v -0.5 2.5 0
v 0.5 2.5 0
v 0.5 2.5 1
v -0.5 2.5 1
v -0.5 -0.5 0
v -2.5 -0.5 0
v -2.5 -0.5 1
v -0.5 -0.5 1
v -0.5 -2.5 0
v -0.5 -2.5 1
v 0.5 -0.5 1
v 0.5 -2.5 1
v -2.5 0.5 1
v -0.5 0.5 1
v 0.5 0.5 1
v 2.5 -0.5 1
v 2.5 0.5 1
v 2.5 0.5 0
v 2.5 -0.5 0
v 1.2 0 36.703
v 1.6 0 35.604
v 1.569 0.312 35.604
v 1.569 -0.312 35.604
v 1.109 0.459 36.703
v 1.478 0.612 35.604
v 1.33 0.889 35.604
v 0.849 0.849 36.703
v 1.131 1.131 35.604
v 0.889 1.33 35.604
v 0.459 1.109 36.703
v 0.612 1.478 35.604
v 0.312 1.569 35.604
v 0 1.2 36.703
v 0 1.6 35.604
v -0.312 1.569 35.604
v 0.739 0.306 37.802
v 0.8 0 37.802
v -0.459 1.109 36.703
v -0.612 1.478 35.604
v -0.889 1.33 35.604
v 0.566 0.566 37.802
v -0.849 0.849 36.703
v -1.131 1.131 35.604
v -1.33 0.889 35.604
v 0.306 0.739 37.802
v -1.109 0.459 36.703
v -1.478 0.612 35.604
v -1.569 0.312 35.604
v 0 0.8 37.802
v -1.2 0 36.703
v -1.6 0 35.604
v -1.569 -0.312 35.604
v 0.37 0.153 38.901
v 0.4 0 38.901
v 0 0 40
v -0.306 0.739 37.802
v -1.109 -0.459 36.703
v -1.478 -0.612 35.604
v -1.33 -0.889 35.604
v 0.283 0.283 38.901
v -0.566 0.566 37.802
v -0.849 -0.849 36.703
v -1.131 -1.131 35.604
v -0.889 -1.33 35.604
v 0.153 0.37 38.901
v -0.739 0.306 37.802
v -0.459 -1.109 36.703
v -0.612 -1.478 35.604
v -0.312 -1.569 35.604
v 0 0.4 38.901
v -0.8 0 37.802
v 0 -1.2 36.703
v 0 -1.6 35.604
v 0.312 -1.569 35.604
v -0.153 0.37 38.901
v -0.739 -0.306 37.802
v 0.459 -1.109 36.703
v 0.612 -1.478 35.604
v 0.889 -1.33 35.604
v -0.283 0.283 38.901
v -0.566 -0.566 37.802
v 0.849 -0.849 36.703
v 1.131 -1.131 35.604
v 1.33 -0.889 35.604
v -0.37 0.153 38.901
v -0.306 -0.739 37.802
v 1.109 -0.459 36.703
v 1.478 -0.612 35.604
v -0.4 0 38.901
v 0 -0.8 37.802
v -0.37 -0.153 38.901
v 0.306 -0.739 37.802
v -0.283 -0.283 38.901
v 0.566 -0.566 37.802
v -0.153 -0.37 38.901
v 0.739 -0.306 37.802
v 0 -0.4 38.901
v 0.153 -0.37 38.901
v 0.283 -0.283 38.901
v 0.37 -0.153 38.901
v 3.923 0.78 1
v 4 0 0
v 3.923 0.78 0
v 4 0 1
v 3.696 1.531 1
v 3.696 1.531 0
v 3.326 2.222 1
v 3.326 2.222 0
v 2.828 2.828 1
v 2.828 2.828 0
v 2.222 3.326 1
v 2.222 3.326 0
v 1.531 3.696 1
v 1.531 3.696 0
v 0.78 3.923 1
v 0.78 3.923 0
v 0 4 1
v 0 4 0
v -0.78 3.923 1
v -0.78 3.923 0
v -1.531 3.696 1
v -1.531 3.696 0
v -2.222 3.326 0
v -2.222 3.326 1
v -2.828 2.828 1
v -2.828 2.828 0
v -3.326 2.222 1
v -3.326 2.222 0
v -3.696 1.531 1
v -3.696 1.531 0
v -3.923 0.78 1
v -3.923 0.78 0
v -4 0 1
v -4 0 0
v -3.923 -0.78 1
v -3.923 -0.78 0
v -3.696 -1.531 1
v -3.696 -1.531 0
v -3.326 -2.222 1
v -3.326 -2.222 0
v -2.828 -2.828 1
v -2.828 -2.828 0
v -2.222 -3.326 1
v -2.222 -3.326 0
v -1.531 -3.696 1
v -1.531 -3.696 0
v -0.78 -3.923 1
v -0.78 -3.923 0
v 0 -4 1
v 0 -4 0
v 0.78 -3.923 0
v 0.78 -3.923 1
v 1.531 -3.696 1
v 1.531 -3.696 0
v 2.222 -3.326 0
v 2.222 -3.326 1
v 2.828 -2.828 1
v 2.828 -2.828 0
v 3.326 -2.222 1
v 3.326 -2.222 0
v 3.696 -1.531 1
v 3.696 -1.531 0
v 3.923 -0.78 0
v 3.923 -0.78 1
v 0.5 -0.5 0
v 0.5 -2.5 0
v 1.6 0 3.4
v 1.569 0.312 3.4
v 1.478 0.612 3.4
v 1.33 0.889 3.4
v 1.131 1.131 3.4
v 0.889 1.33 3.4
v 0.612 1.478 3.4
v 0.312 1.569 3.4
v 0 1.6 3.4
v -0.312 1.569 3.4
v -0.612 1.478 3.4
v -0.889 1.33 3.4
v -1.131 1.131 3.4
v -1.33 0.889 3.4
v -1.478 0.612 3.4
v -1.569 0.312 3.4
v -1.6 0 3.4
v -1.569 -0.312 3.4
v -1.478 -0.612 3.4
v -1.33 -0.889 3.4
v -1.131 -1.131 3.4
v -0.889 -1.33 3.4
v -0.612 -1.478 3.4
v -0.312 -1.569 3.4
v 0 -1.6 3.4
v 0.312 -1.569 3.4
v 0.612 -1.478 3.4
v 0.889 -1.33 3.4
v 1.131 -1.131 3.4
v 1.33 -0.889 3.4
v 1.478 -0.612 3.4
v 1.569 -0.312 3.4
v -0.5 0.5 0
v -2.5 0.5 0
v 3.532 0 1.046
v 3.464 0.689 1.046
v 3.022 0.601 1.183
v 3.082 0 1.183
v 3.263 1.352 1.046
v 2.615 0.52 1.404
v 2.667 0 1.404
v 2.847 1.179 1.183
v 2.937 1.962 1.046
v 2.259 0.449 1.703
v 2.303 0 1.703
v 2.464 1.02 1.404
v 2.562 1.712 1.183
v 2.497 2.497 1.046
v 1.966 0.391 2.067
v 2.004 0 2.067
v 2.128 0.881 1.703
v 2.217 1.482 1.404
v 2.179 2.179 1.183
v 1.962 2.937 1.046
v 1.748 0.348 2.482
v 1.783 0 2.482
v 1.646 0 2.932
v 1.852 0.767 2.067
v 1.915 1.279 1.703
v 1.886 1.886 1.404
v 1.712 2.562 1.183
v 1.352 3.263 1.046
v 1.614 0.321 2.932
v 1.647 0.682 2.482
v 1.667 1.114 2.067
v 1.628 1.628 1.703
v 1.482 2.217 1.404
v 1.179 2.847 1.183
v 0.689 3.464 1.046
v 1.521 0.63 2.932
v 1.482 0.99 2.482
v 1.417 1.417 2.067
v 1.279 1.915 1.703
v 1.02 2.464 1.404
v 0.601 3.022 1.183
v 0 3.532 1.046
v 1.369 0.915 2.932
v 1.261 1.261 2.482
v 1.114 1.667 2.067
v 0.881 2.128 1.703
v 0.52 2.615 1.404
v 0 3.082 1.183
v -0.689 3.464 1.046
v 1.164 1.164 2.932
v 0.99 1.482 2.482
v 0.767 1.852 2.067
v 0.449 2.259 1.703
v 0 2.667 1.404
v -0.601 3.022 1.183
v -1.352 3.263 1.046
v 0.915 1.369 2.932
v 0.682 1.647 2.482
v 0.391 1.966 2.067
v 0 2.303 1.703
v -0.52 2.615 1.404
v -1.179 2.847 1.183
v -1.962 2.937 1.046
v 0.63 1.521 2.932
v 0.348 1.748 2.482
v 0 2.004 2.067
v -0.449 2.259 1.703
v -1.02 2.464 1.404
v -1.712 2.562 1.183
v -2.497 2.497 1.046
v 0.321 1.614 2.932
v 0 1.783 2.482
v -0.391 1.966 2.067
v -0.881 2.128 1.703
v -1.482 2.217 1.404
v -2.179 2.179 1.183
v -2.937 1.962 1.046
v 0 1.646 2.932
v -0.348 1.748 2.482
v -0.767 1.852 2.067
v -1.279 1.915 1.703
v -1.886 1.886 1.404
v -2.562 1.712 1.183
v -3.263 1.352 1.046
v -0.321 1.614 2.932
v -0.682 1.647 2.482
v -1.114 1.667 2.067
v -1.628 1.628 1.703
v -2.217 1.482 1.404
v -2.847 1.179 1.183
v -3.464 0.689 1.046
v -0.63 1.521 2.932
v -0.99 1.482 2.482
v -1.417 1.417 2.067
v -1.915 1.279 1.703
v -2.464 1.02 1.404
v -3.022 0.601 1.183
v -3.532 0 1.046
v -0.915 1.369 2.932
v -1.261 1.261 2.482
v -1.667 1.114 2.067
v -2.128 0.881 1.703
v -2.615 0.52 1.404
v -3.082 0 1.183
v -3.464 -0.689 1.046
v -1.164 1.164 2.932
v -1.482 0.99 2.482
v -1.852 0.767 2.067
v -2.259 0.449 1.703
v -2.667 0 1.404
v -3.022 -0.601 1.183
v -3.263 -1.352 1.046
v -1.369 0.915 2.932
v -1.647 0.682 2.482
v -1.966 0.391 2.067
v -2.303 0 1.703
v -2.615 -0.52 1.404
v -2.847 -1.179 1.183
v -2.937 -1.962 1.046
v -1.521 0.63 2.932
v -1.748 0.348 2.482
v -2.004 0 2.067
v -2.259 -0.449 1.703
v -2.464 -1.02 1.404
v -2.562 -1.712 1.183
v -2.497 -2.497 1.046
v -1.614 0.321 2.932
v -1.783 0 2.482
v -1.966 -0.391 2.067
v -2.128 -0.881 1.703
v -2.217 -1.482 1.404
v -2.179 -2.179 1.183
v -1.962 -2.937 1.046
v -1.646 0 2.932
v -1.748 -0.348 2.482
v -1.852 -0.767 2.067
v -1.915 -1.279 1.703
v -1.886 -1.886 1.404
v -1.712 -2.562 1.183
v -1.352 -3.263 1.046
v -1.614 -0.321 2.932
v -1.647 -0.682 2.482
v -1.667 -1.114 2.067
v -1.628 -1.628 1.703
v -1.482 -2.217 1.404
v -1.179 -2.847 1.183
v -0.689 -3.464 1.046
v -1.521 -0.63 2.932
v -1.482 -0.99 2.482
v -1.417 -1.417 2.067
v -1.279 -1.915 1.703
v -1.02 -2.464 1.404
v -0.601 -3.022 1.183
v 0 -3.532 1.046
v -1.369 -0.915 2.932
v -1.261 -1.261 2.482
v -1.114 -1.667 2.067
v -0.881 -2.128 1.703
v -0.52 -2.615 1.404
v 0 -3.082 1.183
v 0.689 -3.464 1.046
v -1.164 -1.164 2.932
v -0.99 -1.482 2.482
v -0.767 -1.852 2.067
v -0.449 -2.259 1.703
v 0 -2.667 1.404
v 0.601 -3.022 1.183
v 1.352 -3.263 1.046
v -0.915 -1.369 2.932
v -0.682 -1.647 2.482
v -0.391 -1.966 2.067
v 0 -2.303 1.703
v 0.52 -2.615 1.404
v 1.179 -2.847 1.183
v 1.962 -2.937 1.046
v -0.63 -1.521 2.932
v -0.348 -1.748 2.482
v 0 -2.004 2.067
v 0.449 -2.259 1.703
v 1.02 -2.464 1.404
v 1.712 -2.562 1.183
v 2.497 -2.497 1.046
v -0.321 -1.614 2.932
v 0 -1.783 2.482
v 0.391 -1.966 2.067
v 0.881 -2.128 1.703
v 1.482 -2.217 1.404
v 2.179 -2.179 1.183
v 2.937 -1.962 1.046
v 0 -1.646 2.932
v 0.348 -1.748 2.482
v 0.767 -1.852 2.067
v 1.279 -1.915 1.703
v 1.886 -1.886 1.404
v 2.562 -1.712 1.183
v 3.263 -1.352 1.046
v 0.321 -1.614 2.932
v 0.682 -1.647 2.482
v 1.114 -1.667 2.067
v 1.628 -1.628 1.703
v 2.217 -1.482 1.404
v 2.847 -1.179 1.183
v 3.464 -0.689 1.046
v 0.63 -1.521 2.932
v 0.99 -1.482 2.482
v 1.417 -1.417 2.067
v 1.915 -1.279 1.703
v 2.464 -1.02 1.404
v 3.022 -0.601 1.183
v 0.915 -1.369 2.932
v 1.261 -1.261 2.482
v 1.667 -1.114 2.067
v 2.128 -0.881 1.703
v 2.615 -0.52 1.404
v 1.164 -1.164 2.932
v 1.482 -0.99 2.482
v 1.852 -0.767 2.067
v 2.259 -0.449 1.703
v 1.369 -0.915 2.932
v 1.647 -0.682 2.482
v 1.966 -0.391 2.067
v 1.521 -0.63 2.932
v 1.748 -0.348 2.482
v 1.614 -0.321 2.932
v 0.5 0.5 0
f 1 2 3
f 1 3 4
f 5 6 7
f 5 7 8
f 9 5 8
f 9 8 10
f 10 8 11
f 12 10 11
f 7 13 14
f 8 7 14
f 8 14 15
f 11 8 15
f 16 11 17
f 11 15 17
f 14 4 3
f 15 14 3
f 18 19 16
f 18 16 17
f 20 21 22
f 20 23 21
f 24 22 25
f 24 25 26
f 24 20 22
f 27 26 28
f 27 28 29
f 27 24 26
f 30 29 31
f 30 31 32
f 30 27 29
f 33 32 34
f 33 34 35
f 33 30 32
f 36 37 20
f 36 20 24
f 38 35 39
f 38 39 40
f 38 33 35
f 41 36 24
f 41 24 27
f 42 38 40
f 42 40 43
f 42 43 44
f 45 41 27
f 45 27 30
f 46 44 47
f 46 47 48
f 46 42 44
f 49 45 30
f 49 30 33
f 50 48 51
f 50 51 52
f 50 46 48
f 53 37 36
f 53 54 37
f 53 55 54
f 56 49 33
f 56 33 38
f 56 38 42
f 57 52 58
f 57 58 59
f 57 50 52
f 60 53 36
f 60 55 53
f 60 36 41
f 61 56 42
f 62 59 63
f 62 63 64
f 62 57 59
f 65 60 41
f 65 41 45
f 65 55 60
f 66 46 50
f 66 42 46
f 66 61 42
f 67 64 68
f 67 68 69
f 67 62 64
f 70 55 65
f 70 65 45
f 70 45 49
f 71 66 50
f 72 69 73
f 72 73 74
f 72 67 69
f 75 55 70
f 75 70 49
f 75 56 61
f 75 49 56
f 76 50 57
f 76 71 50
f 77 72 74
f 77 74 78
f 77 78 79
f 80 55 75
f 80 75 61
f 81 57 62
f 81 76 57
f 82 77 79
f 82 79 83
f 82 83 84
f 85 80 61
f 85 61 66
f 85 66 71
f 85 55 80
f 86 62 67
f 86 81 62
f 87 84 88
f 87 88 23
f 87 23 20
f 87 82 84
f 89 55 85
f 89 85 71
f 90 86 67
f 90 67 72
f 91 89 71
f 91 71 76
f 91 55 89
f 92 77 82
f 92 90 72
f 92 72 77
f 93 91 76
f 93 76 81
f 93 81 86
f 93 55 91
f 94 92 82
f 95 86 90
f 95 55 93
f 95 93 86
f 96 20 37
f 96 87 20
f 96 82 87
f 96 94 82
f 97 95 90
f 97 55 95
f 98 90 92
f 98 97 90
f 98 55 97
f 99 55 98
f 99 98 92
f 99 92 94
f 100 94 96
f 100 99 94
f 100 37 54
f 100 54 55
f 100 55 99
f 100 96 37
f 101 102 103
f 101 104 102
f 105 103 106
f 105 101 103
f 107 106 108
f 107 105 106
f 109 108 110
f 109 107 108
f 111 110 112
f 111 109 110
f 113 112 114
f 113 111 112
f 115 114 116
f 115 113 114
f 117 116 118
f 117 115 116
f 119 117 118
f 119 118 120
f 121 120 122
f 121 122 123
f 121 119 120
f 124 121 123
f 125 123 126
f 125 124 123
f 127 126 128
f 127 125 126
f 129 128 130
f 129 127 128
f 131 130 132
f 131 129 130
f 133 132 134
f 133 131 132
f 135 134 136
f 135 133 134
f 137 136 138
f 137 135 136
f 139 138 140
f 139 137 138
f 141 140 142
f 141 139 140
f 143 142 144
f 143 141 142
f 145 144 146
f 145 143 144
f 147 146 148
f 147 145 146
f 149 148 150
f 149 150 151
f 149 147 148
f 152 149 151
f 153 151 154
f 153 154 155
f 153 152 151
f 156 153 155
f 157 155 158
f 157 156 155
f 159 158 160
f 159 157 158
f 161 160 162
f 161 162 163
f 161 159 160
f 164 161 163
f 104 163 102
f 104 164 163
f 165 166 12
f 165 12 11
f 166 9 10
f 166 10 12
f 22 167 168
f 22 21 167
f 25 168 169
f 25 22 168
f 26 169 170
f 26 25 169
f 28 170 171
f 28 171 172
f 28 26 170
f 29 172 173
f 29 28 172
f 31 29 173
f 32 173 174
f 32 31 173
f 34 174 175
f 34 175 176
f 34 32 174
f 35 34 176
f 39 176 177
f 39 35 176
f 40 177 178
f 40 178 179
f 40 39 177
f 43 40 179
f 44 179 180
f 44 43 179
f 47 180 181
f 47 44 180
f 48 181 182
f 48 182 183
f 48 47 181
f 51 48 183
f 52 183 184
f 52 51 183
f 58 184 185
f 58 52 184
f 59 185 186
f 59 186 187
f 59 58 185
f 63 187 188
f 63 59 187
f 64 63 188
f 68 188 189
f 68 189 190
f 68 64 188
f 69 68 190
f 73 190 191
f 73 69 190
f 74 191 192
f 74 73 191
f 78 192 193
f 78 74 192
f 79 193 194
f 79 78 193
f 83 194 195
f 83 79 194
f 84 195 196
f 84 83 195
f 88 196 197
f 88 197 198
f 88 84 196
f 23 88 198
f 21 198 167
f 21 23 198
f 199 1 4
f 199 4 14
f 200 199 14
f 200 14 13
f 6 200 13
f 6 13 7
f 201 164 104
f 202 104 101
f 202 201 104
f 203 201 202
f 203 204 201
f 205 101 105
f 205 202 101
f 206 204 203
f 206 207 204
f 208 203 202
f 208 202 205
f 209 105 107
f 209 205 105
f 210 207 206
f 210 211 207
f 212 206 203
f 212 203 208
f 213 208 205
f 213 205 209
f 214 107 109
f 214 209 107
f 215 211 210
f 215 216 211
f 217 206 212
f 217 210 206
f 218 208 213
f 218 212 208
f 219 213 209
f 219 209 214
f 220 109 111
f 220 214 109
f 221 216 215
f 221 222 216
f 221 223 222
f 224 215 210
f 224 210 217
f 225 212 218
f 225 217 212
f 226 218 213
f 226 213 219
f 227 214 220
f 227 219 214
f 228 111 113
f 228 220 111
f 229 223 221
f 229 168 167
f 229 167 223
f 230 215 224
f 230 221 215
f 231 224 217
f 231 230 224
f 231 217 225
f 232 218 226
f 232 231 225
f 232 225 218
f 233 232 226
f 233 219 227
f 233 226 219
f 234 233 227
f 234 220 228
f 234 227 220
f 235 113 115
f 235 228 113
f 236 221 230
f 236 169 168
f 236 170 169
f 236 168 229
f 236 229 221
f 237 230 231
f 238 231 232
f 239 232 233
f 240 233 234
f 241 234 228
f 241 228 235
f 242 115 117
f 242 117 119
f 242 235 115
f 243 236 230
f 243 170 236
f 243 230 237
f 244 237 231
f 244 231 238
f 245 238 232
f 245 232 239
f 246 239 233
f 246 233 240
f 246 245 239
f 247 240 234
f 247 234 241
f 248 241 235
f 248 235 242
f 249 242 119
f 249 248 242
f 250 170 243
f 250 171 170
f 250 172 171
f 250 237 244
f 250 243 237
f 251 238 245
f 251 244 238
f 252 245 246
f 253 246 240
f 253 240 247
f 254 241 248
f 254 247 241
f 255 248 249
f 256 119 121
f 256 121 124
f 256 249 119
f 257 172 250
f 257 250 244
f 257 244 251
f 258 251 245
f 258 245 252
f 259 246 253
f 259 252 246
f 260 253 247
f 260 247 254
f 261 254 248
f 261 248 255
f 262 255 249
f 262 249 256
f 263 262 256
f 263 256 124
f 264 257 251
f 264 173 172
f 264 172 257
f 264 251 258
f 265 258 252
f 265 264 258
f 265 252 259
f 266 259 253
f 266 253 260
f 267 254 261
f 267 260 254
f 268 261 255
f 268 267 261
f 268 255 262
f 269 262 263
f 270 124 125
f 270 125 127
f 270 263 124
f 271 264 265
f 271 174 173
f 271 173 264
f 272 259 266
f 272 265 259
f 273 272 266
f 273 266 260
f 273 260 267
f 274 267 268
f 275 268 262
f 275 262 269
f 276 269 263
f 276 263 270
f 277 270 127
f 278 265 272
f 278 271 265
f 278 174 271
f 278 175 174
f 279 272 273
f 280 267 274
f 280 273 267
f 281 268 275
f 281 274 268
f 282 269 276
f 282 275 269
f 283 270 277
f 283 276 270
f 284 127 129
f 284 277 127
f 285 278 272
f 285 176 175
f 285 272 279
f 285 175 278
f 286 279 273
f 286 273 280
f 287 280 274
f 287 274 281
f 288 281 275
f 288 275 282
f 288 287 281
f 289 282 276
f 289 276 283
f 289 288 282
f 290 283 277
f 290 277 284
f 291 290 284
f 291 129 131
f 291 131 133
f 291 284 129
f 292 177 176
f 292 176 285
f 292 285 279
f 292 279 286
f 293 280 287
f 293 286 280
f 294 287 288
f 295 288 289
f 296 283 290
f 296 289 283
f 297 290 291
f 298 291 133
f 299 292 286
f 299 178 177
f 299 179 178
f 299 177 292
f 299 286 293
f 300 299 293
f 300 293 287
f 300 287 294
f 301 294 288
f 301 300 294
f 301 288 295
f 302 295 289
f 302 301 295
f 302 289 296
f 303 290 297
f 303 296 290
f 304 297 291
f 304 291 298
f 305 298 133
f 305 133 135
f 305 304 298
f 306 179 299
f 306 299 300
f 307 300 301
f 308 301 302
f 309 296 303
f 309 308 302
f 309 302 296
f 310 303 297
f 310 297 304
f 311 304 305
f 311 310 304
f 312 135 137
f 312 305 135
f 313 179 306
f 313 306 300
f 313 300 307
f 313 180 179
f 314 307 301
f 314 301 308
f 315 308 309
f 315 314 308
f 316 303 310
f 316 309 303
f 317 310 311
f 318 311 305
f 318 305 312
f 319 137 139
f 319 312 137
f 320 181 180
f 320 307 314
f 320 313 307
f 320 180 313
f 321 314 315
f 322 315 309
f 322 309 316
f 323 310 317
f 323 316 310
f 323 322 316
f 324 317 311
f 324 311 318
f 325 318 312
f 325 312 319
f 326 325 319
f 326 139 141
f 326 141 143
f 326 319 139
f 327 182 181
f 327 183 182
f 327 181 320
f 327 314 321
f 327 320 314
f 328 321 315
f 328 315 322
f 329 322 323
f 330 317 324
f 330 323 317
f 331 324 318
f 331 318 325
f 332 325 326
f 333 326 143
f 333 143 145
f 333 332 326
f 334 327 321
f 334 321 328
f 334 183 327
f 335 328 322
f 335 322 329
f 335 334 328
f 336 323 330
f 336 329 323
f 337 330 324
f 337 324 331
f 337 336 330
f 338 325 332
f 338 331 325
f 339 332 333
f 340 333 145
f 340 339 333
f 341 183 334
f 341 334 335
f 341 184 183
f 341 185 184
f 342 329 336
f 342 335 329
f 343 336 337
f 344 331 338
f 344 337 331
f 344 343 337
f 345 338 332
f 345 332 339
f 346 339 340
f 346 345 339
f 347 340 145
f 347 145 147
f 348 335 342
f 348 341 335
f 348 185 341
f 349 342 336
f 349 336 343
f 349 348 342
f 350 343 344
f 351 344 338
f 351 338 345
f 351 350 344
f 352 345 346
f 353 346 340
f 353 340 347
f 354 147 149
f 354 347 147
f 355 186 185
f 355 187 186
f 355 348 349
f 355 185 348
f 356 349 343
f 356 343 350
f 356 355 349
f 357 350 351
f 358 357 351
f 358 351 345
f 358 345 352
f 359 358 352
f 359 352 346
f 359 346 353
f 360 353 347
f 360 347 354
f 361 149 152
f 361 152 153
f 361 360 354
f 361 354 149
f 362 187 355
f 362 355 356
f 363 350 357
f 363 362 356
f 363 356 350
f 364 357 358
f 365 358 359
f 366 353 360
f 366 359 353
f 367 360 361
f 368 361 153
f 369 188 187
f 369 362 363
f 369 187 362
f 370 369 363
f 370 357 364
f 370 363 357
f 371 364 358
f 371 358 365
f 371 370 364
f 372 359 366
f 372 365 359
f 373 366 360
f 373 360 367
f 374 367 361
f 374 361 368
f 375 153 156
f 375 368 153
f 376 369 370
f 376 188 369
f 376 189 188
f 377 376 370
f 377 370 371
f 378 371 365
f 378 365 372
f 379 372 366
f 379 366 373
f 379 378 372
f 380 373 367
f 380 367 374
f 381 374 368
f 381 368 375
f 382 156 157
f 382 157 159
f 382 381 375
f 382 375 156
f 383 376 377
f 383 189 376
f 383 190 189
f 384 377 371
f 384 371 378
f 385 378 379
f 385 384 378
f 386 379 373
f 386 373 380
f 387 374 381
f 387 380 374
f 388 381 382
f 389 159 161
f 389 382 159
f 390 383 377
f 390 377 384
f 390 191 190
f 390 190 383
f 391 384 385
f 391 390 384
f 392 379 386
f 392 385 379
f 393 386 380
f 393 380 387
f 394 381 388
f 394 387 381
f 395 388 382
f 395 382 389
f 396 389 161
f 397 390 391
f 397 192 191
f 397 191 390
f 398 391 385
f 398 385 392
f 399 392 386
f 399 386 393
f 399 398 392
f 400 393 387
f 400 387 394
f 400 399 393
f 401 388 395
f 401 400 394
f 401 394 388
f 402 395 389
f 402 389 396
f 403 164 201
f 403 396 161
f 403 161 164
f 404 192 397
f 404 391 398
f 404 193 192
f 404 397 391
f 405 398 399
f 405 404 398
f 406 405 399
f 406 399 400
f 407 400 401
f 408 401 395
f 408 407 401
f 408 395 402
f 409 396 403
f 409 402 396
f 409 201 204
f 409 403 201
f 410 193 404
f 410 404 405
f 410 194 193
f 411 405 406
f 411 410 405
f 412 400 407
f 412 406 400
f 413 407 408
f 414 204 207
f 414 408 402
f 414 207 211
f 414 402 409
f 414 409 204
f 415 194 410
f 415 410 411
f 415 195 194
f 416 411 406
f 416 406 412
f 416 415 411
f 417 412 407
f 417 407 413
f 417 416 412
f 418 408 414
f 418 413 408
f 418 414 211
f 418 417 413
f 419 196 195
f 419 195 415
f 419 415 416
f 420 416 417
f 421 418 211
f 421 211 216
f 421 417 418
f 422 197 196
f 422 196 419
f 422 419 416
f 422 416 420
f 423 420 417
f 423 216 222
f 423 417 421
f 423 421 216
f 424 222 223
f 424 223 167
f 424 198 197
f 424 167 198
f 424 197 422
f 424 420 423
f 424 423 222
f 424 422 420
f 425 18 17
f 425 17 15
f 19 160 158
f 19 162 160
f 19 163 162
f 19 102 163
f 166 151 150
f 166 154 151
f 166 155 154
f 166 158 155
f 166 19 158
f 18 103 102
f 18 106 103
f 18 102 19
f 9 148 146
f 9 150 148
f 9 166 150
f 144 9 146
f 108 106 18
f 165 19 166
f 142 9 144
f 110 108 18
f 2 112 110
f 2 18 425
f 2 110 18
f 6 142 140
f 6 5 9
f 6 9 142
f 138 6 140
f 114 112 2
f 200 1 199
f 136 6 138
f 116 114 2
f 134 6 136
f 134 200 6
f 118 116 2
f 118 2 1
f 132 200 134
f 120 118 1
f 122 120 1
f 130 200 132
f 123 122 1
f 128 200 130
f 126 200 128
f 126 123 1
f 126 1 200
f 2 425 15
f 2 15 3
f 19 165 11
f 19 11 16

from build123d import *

# Parameters (mm, degrees)
F3_DEPTH        = 1
F3_COPIES_COUNT = 4


# Not quite as in the source:
# - a pattern or mirror of a feature is missing from the dataset's text; its kind, count and spacing are read off the source's solid


with BuildPart() as f1:
    # F0 (on Front) → F1 (revolve)
    with BuildSketch(Plane.XZ):
        with BuildLine():
            Line((1.6, 35.6040361289), (0, 40))
            Line((0, 40), (0, 0))
            Line((0, 0), (4, 0))
            Line((4, 0), (4, 1))
            ThreePointArc((4, 1), (2.3029437252, 1.7029437252), (1.6, 3.4))
            Line((1.6, 3.4), (1.6, 35.6040361289))
        make_face()
    revolve(axis=Axis((0, 0, 20), (0, 0, 1)))

    # F2 (on Top) → F3 (cut)
    with BuildSketch(Plane.XY):
        Polygon((2.5, 0), (0, 0), (0, -2.5), (0.5, -2.5), (0.5, -0.5), (2.5, -0.5), align=None)
    f3 = extrude(amount=F3_DEPTH, mode=Mode.SUBTRACT)

    # F3_copies: F3 ×4 about axis
    f3_copies_axis = Axis((0, 0, 0), (0, 0, 1))
    for i in range(1, F3_COPIES_COUNT):
        add(f3.rotate(f3_copies_axis, i * 360 / F3_COPIES_COUNT), mode=Mode.SUBTRACT)


solid = f1.part
